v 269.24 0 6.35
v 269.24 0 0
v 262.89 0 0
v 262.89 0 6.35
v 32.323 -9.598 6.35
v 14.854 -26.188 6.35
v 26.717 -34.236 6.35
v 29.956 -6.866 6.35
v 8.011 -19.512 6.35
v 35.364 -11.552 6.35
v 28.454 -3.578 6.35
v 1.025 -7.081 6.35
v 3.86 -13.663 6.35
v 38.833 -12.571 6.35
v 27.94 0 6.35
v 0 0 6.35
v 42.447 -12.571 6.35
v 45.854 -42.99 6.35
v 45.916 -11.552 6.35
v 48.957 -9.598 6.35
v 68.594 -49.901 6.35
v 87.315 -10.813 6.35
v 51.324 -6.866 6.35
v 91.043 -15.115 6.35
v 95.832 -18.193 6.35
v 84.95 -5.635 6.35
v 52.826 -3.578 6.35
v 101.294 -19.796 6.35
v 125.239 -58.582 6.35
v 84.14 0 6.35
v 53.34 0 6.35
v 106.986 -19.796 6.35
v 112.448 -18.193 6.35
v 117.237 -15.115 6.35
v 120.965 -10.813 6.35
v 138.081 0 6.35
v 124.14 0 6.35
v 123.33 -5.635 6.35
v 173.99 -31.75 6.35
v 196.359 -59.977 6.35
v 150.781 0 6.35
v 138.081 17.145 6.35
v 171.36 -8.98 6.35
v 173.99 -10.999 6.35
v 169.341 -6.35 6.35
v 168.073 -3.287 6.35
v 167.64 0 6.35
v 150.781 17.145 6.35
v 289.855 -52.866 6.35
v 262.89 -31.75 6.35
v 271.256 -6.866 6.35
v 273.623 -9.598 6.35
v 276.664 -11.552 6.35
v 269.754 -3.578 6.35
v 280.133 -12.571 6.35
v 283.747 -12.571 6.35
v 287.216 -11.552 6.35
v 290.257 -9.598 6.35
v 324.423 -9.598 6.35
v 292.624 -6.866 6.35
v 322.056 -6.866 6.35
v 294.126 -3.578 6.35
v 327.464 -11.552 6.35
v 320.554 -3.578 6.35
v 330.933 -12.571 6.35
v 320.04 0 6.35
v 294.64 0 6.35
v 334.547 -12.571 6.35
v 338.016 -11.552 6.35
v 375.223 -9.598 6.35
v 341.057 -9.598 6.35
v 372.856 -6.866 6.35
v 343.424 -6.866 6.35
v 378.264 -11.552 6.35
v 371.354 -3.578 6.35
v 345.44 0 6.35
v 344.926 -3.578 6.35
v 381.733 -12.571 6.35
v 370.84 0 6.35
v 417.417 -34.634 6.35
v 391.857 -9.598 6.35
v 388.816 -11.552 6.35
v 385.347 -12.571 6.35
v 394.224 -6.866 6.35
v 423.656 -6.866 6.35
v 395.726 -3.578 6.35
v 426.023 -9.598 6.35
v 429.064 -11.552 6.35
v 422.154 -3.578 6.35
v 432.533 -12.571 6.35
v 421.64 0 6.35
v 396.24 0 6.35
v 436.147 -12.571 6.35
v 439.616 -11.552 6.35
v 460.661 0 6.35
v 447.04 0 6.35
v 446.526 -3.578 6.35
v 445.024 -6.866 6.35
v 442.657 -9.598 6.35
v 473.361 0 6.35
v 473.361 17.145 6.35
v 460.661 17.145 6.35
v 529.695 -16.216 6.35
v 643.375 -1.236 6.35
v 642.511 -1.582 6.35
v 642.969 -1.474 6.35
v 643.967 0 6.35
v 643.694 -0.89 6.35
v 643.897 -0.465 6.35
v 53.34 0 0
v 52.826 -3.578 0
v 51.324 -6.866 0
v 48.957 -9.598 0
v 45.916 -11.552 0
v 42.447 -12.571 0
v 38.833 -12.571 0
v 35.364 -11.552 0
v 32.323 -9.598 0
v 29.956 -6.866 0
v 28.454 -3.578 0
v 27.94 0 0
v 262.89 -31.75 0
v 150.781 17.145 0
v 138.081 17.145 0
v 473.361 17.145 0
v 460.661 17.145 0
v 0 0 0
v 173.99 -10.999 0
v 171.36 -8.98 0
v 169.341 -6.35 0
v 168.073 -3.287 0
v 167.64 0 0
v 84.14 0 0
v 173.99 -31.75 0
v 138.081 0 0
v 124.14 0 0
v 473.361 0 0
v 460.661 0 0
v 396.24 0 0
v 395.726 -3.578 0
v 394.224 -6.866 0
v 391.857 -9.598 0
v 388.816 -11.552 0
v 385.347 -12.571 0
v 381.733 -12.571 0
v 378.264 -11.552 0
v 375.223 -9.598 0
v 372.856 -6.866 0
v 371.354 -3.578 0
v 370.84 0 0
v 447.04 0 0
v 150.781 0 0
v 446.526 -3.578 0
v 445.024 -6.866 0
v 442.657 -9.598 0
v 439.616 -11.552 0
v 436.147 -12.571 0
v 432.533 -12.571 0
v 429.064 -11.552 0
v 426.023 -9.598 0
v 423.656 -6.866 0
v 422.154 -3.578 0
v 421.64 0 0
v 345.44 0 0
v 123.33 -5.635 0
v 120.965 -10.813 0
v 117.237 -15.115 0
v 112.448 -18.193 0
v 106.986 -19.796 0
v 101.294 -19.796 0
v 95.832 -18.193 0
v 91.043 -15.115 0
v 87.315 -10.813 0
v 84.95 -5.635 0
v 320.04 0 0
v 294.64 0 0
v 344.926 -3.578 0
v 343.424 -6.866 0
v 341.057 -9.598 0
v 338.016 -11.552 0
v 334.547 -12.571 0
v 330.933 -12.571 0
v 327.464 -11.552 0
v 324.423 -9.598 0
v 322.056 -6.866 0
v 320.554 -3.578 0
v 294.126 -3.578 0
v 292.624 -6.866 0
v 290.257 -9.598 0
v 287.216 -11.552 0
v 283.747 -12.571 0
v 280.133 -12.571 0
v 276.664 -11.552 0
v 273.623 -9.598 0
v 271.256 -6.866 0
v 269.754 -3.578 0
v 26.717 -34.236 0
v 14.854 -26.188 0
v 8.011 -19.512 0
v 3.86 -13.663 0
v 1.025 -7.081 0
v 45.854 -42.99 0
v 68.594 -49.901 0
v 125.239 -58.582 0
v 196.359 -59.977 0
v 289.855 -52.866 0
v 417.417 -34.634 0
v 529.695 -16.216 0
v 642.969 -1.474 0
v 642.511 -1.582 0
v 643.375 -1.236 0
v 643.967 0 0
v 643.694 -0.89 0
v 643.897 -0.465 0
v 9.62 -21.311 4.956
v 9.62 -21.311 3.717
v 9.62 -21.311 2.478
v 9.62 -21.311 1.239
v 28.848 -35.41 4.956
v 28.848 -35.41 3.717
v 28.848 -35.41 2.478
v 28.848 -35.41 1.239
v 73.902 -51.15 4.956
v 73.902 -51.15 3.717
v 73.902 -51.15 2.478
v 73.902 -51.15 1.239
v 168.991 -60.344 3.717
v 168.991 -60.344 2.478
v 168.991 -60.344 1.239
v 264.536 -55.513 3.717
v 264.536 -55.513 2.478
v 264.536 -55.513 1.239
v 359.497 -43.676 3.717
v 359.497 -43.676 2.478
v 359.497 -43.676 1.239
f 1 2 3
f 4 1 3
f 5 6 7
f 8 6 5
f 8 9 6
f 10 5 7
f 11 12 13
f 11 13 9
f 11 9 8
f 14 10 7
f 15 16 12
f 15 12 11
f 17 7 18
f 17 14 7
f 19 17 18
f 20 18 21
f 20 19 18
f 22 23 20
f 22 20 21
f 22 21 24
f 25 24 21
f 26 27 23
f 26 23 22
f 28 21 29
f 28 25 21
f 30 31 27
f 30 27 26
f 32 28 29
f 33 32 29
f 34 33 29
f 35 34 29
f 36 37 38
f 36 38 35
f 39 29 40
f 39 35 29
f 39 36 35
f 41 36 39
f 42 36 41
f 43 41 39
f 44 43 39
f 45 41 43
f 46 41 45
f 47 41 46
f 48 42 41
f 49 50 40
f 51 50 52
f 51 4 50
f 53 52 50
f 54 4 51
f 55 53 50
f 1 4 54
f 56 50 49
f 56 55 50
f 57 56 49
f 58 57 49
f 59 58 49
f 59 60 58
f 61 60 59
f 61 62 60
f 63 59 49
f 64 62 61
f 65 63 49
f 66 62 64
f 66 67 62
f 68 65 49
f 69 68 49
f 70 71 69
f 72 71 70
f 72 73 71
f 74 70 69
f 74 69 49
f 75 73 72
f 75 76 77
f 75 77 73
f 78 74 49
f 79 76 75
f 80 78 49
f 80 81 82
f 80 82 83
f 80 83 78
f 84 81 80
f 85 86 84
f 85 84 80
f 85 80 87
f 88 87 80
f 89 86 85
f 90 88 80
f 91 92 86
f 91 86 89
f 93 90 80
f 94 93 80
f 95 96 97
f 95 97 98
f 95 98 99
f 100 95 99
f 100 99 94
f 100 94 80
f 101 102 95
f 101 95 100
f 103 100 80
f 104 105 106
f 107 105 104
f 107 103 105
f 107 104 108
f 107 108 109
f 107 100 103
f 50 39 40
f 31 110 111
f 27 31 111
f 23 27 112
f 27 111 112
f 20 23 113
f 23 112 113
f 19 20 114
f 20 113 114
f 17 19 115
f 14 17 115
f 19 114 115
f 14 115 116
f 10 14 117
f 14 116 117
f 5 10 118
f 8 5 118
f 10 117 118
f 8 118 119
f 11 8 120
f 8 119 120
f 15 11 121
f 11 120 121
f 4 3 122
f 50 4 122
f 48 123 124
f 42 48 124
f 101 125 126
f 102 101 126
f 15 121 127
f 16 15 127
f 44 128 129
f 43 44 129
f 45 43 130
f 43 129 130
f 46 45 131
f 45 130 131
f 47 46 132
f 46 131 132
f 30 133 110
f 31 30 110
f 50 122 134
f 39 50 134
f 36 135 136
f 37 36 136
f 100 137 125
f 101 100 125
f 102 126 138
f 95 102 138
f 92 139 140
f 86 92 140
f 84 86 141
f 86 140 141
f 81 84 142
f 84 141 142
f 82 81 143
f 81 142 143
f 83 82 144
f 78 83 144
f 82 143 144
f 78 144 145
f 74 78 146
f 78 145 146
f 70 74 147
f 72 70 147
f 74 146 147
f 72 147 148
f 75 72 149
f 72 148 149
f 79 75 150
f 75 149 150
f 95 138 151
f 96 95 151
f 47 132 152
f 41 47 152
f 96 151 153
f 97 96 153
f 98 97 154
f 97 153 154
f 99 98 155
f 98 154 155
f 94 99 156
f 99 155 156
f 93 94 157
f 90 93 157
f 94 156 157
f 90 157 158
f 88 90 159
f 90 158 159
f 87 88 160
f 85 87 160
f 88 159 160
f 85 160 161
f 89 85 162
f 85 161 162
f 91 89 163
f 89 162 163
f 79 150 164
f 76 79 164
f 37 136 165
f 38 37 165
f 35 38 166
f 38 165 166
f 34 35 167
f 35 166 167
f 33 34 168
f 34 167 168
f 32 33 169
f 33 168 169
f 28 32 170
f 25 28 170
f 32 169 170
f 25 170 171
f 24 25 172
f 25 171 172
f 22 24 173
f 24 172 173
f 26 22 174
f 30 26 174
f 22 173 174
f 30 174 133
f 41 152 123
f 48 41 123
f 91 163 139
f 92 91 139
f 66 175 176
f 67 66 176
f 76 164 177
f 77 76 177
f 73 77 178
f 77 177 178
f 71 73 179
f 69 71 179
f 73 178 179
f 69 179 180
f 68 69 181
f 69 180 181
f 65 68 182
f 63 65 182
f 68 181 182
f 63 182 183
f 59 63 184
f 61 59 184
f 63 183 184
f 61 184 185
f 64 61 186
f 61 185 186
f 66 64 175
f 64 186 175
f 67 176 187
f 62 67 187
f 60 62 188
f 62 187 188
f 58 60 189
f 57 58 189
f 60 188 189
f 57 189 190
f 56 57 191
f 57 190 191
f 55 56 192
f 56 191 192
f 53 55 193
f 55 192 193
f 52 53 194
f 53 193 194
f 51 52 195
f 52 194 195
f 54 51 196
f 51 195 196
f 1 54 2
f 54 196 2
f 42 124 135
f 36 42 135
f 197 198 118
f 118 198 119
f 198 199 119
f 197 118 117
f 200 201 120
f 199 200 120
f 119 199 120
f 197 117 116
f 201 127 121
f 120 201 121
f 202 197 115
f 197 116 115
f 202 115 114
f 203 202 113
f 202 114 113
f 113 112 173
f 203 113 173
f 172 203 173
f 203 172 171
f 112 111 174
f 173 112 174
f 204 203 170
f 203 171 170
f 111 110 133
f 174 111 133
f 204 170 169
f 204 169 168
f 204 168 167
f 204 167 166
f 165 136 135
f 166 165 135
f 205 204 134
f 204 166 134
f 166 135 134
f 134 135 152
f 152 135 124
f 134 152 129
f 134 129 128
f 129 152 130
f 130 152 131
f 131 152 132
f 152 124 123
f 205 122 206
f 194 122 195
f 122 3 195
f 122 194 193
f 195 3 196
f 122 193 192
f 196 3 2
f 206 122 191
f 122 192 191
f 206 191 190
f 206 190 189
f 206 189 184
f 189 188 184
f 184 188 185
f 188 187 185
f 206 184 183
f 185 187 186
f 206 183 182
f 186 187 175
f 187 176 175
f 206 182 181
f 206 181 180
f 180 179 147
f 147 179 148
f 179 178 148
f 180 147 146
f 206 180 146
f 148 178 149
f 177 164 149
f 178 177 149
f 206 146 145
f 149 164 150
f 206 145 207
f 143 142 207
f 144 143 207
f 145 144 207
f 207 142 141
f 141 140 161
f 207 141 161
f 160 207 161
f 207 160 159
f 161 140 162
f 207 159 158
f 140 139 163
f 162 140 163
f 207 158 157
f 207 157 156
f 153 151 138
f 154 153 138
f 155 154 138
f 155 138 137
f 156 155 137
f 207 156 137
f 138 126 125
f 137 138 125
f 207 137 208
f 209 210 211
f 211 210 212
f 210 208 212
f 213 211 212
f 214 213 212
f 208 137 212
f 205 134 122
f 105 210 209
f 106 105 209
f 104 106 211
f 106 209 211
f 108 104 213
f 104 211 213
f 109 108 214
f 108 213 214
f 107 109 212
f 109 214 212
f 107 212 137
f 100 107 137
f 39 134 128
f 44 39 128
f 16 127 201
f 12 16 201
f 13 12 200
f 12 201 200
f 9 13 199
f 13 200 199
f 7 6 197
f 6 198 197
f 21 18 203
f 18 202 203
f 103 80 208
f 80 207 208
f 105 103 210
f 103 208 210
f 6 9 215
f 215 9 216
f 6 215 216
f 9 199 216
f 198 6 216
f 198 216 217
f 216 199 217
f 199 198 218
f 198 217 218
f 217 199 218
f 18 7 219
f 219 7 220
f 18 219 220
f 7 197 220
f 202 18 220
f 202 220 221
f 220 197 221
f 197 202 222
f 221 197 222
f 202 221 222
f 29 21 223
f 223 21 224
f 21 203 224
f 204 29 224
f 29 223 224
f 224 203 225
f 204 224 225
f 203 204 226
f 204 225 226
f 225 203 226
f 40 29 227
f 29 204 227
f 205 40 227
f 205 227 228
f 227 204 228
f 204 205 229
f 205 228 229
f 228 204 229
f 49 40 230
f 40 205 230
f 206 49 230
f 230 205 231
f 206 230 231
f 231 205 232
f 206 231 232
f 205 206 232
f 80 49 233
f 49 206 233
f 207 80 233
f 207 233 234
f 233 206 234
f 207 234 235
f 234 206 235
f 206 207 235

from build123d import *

# Parameters (mm, degrees)
BOSS_EXTRUDE1_DEPTH = 6.35


with BuildPart() as part:
    # Sketch2 → Boss-Extrude1 (new body)
    with BuildSketch(Plane.XY):
        with BuildLine():
            Line((138.080965279, 0), (124.14, 0))
            ThreePointArc((124.14, 0), (104.14, -20), (84.14, 0))
            Line((84.14, 0), (53.34, 0))
            ThreePointArc((53.34, 0), (40.64, -12.7), (27.94, 0))
            Line((27.94, 0), (0, 0))
            add(Edge.make_bspline(
                [(0, 0), (0, -1.007496172), (0.154611582, -3.513796615), (1.106333228, -7.923389435), (3.463136343, -13.420354421), (7.689616489, -19.513207632), (13.932423524, -25.726412106), (22.129107375, -31.731455339), (32.141645239, -37.332204029), (43.82045433, -42.41500246), (57.023709725, -46.912543066), (71.619696083, -50.784752003), (87.485018636, -54.008935199), (104.502313427, -56.574303932), (122.558104573, -58.481758104), (141.542033828, -59.739895824), (161.345829027, -60.366961324), (181.863132616, -60.387506142), (202.989192599, -59.8341217), (224.620860897, -58.745176641), (246.65655865, -57.164603829), (268.996310773, -55.141201012), (291.541767704, -52.727712704), (314.196207315, -49.979843895), (336.86454415, -46.955447457), (359.453314895, -43.713502532), (381.870662856, -40.313266856), (404.02631566, -36.813220545), (425.831595832, -33.270324121), (447.199424328, -29.739007432), (468.044367735, -26.27043606), (488.282710288, -22.911672601), (507.832591566, -19.705111663), (526.614143658, -16.687720753), (544.549749946, -13.890665375), (561.564270734, -11.338919625), (577.585454095, -9.050636147), (592.543922516, -7.037634907), (606.374988512, -5.304428983), (619.014124193, -3.849253664), (630.413817462, -2.663385493), (638.093728429, -1.953546407), (641.993392355, -1.625070631), (642.510849283, -1.582039112)],
                knots=[0.5, 0.5, 0.5, 0.5, 0.502166769, 0.505390167, 0.509655974, 0.514947682, 0.521244711, 0.528520886, 0.536744945, 0.54588136, 0.555890751, 0.566730119, 0.57835299, 0.590709588, 0.603747039, 0.617409572, 0.631638768, 0.646373793, 0.661551658, 0.677107483, 0.692974771, 0.709085713, 0.725371443, 0.741762353, 0.758188398, 0.774579367, 0.790865214, 0.806976332, 0.822843867, 0.838400002, 0.853578262, 0.868313774, 0.882543568, 0.896206835, 0.909245173, 0.92160287, 0.933227116, 0.944068236, 0.954079898, 0.963219316, 0.971447445, 0.978729112, 0.979842958, 0.979842958, 0.979842958, 0.979842958], degree=3))
            ThreePointArc((642.510849283, -1.582039112), (643.547407924, -1.075012082), (643.966787522, 0))
            Line((643.966787522, 0), (473.360965279, 0))
            Line((473.360965279, 0), (473.360965279, 17.145))
            Line((473.360965279, 17.145), (460.660965279, 17.145))
            Line((460.660965279, 17.145), (460.660965279, 0))
            Line((460.660965279, 0), (447.04, 0))
            ThreePointArc((447.04, 0), (434.34, -12.7), (421.64, 0))
            Line((421.64, 0), (396.24, 0))
            ThreePointArc((396.24, 0), (383.54, -12.7), (370.84, 0))
            Line((370.84, 0), (345.44, 0))
            ThreePointArc((345.44, 0), (332.74, -12.7), (320.04, 0))
            Line((320.04, 0), (294.64, 0))
            ThreePointArc((294.64, 0), (281.94, -12.7), (269.24, 0))
            Line((269.24, 0), (262.89, 0))
            Line((262.89, 0), (262.89, -31.75))
            Line((262.89, -31.75), (173.99, -31.75))
            Line((173.99, -31.75), (173.99, -10.998522628))
            ThreePointArc((173.99, -10.998522628), (169.341477372, -6.35), (167.64, 0))
            Line((167.64, 0), (150.780965279, 0))
            Line((150.780965279, 0), (150.780965279, 17.145))
            Line((150.780965279, 17.145), (138.080965279, 17.145))
            Line((138.080965279, 17.145), (138.080965279, 0))
        make_face()
    extrude(amount=BOSS_EXTRUDE1_DEPTH)


solid = part.part
